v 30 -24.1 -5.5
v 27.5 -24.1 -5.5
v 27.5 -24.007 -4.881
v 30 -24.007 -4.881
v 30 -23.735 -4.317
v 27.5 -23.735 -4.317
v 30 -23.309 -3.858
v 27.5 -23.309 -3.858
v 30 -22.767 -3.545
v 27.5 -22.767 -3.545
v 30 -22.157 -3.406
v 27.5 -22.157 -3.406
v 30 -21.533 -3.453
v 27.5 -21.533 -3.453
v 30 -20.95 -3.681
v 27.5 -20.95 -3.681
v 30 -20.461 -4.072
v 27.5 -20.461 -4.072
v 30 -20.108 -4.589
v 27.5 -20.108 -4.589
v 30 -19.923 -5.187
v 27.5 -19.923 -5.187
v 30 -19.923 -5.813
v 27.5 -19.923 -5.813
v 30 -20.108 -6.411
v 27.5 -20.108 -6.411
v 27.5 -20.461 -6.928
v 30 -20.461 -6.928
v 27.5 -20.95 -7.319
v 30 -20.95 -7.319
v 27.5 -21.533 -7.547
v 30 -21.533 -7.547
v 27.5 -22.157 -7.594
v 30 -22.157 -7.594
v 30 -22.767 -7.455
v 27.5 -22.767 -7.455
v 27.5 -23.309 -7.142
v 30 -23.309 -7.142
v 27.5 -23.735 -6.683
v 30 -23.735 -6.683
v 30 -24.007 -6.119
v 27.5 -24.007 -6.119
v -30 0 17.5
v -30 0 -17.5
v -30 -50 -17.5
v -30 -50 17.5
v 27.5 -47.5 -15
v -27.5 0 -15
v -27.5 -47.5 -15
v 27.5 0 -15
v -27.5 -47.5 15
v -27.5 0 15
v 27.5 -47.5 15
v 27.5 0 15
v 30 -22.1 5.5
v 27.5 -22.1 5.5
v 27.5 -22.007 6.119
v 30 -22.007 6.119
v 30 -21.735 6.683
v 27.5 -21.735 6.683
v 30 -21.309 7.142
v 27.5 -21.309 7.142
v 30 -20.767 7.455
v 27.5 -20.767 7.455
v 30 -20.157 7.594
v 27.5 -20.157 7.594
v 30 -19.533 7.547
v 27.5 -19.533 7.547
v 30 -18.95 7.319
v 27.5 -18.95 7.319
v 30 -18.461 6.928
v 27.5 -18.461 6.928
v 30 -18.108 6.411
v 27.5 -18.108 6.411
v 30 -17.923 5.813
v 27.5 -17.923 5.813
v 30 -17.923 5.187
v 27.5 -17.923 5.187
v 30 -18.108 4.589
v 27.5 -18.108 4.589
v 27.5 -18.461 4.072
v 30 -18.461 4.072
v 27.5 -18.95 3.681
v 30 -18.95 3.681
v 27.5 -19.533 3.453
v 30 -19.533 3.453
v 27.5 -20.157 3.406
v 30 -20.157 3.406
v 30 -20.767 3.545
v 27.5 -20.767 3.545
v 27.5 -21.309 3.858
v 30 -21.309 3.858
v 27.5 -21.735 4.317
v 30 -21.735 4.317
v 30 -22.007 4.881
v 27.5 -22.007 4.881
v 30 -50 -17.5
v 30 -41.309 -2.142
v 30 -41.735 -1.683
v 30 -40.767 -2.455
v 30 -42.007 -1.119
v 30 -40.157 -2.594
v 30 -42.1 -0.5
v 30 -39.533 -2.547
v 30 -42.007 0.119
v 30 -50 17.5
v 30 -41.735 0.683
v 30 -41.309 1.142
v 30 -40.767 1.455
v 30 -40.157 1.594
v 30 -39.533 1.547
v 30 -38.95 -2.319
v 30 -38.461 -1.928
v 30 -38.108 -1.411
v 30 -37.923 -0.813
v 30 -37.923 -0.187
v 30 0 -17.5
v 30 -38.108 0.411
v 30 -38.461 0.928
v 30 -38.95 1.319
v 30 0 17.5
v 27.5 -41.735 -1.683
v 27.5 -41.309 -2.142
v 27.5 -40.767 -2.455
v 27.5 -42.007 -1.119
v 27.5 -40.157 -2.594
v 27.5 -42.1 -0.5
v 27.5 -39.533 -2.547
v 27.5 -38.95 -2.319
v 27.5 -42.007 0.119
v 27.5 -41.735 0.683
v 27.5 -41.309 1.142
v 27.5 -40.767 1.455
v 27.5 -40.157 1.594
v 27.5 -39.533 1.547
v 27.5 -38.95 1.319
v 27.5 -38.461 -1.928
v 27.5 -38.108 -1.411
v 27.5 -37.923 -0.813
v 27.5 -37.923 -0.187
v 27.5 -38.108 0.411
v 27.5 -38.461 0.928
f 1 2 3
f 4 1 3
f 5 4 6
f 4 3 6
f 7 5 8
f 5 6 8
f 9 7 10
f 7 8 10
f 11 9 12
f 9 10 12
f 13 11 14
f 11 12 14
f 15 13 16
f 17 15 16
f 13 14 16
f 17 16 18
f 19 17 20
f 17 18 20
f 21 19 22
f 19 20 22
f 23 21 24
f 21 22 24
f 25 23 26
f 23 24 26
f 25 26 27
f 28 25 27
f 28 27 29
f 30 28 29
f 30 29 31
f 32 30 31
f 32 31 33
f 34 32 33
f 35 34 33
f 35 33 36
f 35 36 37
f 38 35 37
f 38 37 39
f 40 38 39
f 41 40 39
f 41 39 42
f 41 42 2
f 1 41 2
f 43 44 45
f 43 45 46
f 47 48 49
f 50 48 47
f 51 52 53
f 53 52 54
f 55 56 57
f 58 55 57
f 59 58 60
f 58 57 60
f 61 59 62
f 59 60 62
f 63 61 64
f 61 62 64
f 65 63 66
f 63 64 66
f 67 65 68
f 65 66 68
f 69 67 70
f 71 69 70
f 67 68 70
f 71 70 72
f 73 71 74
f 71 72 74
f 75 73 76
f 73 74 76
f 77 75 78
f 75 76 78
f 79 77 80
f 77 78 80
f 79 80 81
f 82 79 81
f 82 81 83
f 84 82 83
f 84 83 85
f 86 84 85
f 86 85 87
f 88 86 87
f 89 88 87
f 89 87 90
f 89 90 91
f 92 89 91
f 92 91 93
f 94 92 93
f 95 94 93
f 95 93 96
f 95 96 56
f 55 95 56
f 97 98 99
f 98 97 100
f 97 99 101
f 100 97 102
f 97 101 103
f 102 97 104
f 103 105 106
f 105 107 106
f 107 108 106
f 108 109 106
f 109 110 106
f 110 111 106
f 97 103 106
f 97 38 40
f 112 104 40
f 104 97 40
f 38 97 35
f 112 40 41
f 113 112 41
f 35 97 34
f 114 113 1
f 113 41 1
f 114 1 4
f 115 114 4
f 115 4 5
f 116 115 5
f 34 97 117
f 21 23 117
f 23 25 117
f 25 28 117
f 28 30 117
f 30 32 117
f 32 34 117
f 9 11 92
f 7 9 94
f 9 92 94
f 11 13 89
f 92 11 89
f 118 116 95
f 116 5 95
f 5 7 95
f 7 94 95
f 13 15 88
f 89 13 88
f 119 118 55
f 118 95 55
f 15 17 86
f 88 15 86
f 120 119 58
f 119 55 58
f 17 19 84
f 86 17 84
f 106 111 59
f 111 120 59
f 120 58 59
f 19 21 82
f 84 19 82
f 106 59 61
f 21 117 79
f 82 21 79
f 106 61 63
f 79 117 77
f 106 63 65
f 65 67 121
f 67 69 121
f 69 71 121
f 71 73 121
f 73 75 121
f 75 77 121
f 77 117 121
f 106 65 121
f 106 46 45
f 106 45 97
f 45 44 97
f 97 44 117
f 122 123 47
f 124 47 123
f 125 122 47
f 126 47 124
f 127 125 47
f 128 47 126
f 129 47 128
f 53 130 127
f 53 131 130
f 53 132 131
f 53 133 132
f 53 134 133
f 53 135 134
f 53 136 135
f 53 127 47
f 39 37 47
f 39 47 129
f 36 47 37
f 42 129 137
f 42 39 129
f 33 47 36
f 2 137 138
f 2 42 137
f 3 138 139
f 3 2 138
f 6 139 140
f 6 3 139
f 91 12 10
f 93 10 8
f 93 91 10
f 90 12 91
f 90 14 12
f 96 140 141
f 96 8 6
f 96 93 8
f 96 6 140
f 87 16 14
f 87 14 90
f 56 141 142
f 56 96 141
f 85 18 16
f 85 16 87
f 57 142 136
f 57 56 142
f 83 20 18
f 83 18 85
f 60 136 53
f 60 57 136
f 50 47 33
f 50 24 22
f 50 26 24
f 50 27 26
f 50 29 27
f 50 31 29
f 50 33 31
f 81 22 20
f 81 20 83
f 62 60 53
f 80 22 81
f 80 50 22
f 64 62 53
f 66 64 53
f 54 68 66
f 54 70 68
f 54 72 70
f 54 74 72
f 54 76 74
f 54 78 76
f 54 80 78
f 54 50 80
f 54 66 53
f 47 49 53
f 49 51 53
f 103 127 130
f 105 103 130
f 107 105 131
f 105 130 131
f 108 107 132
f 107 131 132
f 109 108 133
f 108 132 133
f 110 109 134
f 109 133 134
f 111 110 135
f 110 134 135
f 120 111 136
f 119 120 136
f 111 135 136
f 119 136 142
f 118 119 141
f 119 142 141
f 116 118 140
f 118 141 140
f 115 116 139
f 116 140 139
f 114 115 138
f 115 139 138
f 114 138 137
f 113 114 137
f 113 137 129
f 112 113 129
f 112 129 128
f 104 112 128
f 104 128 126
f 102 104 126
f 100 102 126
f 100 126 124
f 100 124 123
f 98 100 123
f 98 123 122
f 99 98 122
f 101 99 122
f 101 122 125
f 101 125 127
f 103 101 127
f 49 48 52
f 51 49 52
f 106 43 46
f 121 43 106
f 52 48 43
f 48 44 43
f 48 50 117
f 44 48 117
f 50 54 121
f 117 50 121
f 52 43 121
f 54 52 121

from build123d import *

# Parameters (mm, degrees)
F0_W     = 60
F0_H     = 35
F1_DEPTH = 50
F2_T     = -2.5
F4_D     = 4.2
F4_DEPTH = 14.4
F4_TIP   = 1.2618073


with BuildPart() as f1:
    # F0 (on Front) → F1 (new body)
    with BuildSketch(Plane.XZ):
        Rectangle(F0_W, F0_H)
    extrude(amount=F1_DEPTH)

    # F2
    f2_openings = [f1.faces().sort_by_distance(p)[0] for p in [
        (0, 0, 0),
    ]]
    offset(amount=F2_T, openings=f2_openings)

    # F4
    with Locations(Plane.YZ.offset(30)):
        with Locations((-40, -0.5), (-20, 5.5), (-22, -5.5)):
            Hole(F4_D / 2, depth=F4_DEPTH)
            with Locations((0, 0, -(F4_DEPTH + F4_TIP / 2))):  # 118° drill point
                Cone(0, F4_D / 2, F4_TIP, mode=Mode.SUBTRACT)


solid = f1.part
